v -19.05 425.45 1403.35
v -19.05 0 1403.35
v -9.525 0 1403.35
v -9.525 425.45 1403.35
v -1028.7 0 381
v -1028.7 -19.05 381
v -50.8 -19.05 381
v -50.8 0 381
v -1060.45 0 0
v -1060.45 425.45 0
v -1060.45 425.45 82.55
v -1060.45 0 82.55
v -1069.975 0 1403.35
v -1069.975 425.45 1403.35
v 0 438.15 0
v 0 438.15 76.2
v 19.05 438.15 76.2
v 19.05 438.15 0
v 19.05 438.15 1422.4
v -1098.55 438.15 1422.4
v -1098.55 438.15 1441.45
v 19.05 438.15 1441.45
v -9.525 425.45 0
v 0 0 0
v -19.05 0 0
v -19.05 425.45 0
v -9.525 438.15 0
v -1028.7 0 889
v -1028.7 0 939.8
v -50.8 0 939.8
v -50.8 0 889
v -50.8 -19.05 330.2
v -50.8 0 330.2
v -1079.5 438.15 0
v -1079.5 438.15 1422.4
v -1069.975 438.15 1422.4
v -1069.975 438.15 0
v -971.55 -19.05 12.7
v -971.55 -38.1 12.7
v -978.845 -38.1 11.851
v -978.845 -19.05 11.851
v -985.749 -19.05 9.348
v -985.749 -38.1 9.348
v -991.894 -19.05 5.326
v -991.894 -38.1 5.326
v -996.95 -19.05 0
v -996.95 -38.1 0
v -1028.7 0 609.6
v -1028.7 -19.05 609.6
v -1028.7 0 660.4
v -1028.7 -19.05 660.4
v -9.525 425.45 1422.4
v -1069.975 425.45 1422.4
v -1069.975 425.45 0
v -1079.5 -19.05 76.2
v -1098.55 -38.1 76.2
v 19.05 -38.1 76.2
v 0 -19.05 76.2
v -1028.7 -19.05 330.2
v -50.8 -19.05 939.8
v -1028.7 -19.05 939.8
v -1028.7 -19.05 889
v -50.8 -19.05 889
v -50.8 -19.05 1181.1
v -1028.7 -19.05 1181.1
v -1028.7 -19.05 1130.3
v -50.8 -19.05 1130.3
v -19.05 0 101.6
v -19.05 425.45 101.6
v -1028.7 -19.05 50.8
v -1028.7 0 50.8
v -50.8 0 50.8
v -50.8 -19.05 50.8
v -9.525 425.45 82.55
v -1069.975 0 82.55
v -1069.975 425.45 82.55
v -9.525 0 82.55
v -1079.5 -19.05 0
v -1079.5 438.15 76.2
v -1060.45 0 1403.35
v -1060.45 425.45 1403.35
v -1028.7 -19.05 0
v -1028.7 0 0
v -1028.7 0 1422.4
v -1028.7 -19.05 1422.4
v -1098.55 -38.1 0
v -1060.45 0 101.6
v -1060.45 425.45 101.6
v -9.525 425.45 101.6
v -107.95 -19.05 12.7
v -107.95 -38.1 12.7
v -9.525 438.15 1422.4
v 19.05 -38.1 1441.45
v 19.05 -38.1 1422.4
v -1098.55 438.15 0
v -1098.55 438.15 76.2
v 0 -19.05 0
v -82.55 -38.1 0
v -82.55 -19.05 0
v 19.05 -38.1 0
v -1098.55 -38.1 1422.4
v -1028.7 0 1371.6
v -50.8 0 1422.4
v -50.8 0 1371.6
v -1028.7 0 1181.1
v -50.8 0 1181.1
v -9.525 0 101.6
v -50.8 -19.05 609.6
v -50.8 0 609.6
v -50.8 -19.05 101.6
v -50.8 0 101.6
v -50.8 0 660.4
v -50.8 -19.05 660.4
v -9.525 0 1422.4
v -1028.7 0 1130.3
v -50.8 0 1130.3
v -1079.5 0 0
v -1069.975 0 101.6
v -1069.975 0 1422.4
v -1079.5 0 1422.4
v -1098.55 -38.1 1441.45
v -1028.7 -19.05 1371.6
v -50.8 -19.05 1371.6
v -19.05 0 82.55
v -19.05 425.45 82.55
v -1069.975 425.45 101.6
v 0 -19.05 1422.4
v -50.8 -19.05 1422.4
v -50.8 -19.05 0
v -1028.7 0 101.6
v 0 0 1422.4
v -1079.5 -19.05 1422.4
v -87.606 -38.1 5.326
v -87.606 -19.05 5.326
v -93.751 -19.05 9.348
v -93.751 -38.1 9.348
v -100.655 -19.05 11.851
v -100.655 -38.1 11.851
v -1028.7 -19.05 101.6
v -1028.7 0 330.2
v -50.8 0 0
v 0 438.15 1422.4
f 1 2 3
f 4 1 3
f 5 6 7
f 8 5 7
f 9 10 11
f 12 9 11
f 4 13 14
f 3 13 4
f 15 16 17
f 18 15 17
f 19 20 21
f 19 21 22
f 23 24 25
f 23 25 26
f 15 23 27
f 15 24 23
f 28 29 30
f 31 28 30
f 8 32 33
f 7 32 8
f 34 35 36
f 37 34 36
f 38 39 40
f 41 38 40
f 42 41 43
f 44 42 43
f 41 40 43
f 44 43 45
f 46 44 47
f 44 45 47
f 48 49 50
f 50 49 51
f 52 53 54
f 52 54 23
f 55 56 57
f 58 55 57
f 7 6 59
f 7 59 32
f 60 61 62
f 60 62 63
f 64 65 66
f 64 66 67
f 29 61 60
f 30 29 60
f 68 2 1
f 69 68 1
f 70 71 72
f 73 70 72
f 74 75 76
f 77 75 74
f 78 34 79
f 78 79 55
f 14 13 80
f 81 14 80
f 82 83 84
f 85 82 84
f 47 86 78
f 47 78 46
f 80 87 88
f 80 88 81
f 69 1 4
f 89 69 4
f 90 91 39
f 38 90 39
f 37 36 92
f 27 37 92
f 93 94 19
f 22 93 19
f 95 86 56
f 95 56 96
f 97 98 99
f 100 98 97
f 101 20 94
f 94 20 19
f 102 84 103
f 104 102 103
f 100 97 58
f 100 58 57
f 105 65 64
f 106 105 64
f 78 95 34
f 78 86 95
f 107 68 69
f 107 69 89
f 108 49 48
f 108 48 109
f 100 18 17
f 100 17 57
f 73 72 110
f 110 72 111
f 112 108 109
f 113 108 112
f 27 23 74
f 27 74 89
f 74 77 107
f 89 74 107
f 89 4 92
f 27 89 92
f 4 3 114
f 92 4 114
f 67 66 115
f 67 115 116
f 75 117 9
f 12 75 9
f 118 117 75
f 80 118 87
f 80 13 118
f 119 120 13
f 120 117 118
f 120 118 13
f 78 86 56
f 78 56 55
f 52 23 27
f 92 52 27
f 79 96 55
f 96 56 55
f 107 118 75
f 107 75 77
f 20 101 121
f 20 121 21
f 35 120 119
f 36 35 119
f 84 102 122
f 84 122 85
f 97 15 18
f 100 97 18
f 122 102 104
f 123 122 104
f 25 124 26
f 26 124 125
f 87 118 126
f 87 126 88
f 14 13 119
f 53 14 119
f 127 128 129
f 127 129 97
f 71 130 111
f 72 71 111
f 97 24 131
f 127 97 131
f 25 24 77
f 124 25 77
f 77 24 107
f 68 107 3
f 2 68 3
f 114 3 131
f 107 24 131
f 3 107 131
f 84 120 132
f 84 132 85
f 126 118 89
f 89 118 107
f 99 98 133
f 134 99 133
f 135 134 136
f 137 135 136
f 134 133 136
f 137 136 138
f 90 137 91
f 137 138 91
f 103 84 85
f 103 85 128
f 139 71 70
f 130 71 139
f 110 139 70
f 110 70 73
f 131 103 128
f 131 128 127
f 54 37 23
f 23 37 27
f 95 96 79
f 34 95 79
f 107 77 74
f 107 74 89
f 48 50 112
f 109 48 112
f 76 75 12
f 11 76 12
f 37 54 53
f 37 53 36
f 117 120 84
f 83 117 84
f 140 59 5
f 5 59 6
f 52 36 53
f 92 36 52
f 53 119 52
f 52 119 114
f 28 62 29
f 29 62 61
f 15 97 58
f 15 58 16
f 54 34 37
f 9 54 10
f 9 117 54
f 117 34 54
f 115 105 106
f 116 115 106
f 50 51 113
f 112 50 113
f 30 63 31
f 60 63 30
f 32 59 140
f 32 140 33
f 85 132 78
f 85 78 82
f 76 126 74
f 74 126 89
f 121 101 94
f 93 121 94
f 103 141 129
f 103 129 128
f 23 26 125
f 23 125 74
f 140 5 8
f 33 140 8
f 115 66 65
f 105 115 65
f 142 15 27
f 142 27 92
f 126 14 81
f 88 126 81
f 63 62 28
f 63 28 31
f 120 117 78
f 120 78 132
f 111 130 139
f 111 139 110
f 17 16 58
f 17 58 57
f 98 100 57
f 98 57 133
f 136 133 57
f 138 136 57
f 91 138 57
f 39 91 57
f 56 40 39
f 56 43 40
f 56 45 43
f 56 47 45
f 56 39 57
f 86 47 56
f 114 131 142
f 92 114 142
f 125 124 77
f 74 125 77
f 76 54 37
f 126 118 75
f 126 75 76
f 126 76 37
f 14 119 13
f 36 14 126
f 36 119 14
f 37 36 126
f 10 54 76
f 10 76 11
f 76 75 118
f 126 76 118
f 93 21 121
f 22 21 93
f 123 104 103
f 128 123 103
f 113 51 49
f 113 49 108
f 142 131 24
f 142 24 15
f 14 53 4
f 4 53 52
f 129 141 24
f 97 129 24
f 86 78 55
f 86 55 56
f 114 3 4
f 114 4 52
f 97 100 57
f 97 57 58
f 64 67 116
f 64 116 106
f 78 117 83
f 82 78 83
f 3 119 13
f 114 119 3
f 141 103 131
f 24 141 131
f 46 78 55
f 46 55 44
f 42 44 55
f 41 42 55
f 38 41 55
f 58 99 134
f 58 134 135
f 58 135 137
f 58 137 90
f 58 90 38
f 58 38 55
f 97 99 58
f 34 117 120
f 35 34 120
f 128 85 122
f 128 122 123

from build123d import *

# Parameters (mm, degrees)
F0_W      = 438.15
F0_H      = 1422.4
F1_DEPTH  = 19.05
F2_W      = 1060.45
F2_H      = 19.05
F3_DEPTH  = 438.15
F5_W      = 19.05
F5_H      = 1422.4
F6_DEPTH  = 438.15
F8_W      = 1060.45
F8_H      = 19.05
F9_DEPTH  = 438.15
F11_W     = 1060.45
F11_H     = 12.7
F12_DEPTH = 1422.4
F14_W     = 50.8
F14_H     = 1422.4
F15_DEPTH = 19.05
F16_W     = 50.8
F16_H     = 1422.4
F17_DEPTH = 19.05
F18_W     = 977.9
F18_H     = 50.8
F19_DEPTH = 19.05
F20_W     = 977.9
F20_H     = 50.8
F21_DEPTH = 19.05
F22_W     = 977.9
F22_H     = 50.8
F23_DEPTH = 19.05
F24_W     = 977.9
F24_H     = 50.8
F25_DEPTH = 19.05
F26_W     = 977.9
F26_H     = 50.8
F27_DEPTH = 19.05
F28_W     = 977.9
F28_H     = 50.8
F29_DEPTH = 19.05
F30_W     = 1117.6
F30_H     = 476.25
F31_DEPTH = 19.05
F33_DEPTH = 76.2
F35_DEPTH = 76.2
F37_DEPTH = 76.2
F39_DEPTH = 19.05


with BuildPart() as f1:
    # F0 (on Right) → F1 (new body)
    with BuildSketch(Plane.YZ):
        with Locations((219.075, 711.2)):
            Rectangle(F0_W, F0_H)
    extrude(amount=-F1_DEPTH)


with BuildPart() as f3:
    # F2 (on face) → F3 (new body)
    with BuildSketch(Plane.XZ):
        with Locations((-539.75, 92.075)):
            Rectangle(F2_W, F2_H)
    extrude(amount=-F3_DEPTH)


with BuildPart() as f1_1:
    add(f1.part)

    # F4: cut F3
    add(f3.part, mode=Mode.SUBTRACT)


with BuildPart() as f6:
    # F5 (on face) → F6 (new body)
    with BuildSketch(Plane.XZ):
        with Locations((-1069.975, 711.2)):
            Rectangle(F5_W, F5_H)
    extrude(amount=-F6_DEPTH)

    # F7: cut F3
    add(f3.part, mode=Mode.SUBTRACT)


with BuildPart() as f9:
    # F8 (on face) → F9 (new body)
    with BuildSketch(Plane.XZ):
        with Locations((-539.75, 1412.875)):
            Rectangle(F8_W, F8_H)
    extrude(amount=-F9_DEPTH)


with BuildPart() as f6_1:
    add(f6.part)

    # F10: cut F9
    add(f9.part, mode=Mode.SUBTRACT)


with BuildPart() as f1_2:
    add(f1_1.part)

    # F10: cut F9
    add(f9.part, mode=Mode.SUBTRACT)


with BuildPart() as f12:
    # F11 (on face) → F12 (new body)
    with BuildSketch(Plane.XY.offset(1422.4)):
        with Locations((-539.75, 431.8)):
            Rectangle(F11_W, F11_H)
    extrude(amount=-F12_DEPTH)


with BuildPart() as f6_2:
    add(f6_1.part)

    # F13: cut F12
    add(f12.part, mode=Mode.SUBTRACT)


with BuildPart() as f9_1:
    add(f9.part)

    # F13: cut F12
    add(f12.part, mode=Mode.SUBTRACT)


with BuildPart() as f1_3:
    add(f1_2.part)

    # F13: cut F12
    add(f12.part, mode=Mode.SUBTRACT)


with BuildPart() as f3_1:
    add(f3.part)

    # F13: cut F12
    add(f12.part, mode=Mode.SUBTRACT)


with BuildPart() as f15:
    # F14 (on face) → F15 (new body)
    with BuildSketch(Plane.XZ):
        with Locations((-1054.1, 711.2)):
            Rectangle(F14_W, F14_H)
    extrude(amount=F15_DEPTH)


with BuildPart() as f17:
    # F16 (on face) → F17 (new body)
    with BuildSketch(Plane.XZ):
        with Locations((-25.4, 711.2)):
            Rectangle(F16_W, F16_H)
    extrude(amount=F17_DEPTH)


with BuildPart() as f19:
    # F18 (on face) → F19 (new body)
    with BuildSketch(Plane.XZ):
        with Locations((-539.75, 76.2)):
            Rectangle(F18_W, F18_H)
    extrude(amount=F19_DEPTH)


with BuildPart() as f21:
    # F20 (on face) → F21 (new body)
    with BuildSketch(Plane.XZ):
        with Locations((-539.75, 1397)):
            Rectangle(F20_W, F20_H)
    extrude(amount=F21_DEPTH)


with BuildPart() as f23:
    # F22 (on face) → F23 (new body)
    with BuildSketch(Plane.XZ.offset(19.05)):
        with Locations((-539.75, 355.6)):
            Rectangle(F22_W, F22_H)
    extrude(amount=-F23_DEPTH)


with BuildPart() as f25:
    # F24 (on face) → F25 (new body)
    with BuildSketch(Plane.XZ.offset(19.05)):
        with Locations((-539.75, 635)):
            Rectangle(F24_W, F24_H)
    extrude(amount=-F25_DEPTH)


with BuildPart() as f27:
    # F26 (on face) → F27 (new body)
    with BuildSketch(Plane.XZ.offset(19.05)):
        with Locations((-539.75, 914.4)):
            Rectangle(F26_W, F26_H)
    extrude(amount=-F27_DEPTH)


with BuildPart() as f29:
    # F28 (on face) → F29 (new body)
    with BuildSketch(Plane.XZ.offset(19.05)):
        with Locations((-539.75, 1155.7)):
            Rectangle(F28_W, F28_H)
    extrude(amount=-F29_DEPTH)


with BuildPart() as f31:
    # F30 (on face) → F31 (new body)
    with BuildSketch(Plane.XY.offset(1422.4)):
        with Locations((-539.75, 200.025)):
            Rectangle(F30_W, F30_H)
    extrude(amount=F31_DEPTH)


with BuildPart() as f33:
    # F32 (on face) → F33 (new body)
    with BuildSketch(Plane(origin=(0, 0, 0), x_dir=(1, 0, 0), z_dir=(0, 0, -1))):
        Polygon((-1098.55, -438.15), (-1079.5, -438.15), (-1079.5, 19.05), (-1098.55, 38.1), align=None)
    extrude(amount=-F33_DEPTH)


with BuildPart() as f35:
    # F34 (on face) → F35 (new body)
    with BuildSketch(Plane(origin=(0, 0, 0), x_dir=(1, 0, 0), z_dir=(0, 0, -1))):
        Polygon((0, 19.05), (0, -438.15), (19.05, -438.15), (19.05, 38.1), align=None)
    extrude(amount=-F35_DEPTH)


with BuildPart() as f37:
    # F36 (on face) → F37 (new body)
    with BuildSketch(Plane(origin=(0, 0, 0), x_dir=(1, 0, 0), z_dir=(0, 0, -1))):
        Polygon((-1079.5, 19.05), (0, 19.05), (19.05, 38.1), (-1098.55, 38.1), align=None)
    extrude(amount=-F37_DEPTH)

    # F38 (on face) → F39 (cut)
    with BuildSketch(Plane.XZ.offset(38.1)):
        with BuildLine():
            Line((-107.95, 12.7), (-971.55, 12.7))
            ThreePointArc((-971.55, 12.7), (-985.749032, 9.348063), (-996.95, 0))
            Line((-996.95, 0), (-82.55, 0))
            ThreePointArc((-82.55, 0), (-93.750968, 9.348063), (-107.95, 12.7))
        make_face()
    extrude(amount=-F39_DEPTH, mode=Mode.SUBTRACT)


solid = Compound([f12.part, f6_2.part, f9_1.part, f1_3.part, f3_1.part, f15.part, f17.part, f19.part, f21.part, f23.part, f25.part, f27.part, f29.part, f31.part, f33.part, f35.part, f37.part])
